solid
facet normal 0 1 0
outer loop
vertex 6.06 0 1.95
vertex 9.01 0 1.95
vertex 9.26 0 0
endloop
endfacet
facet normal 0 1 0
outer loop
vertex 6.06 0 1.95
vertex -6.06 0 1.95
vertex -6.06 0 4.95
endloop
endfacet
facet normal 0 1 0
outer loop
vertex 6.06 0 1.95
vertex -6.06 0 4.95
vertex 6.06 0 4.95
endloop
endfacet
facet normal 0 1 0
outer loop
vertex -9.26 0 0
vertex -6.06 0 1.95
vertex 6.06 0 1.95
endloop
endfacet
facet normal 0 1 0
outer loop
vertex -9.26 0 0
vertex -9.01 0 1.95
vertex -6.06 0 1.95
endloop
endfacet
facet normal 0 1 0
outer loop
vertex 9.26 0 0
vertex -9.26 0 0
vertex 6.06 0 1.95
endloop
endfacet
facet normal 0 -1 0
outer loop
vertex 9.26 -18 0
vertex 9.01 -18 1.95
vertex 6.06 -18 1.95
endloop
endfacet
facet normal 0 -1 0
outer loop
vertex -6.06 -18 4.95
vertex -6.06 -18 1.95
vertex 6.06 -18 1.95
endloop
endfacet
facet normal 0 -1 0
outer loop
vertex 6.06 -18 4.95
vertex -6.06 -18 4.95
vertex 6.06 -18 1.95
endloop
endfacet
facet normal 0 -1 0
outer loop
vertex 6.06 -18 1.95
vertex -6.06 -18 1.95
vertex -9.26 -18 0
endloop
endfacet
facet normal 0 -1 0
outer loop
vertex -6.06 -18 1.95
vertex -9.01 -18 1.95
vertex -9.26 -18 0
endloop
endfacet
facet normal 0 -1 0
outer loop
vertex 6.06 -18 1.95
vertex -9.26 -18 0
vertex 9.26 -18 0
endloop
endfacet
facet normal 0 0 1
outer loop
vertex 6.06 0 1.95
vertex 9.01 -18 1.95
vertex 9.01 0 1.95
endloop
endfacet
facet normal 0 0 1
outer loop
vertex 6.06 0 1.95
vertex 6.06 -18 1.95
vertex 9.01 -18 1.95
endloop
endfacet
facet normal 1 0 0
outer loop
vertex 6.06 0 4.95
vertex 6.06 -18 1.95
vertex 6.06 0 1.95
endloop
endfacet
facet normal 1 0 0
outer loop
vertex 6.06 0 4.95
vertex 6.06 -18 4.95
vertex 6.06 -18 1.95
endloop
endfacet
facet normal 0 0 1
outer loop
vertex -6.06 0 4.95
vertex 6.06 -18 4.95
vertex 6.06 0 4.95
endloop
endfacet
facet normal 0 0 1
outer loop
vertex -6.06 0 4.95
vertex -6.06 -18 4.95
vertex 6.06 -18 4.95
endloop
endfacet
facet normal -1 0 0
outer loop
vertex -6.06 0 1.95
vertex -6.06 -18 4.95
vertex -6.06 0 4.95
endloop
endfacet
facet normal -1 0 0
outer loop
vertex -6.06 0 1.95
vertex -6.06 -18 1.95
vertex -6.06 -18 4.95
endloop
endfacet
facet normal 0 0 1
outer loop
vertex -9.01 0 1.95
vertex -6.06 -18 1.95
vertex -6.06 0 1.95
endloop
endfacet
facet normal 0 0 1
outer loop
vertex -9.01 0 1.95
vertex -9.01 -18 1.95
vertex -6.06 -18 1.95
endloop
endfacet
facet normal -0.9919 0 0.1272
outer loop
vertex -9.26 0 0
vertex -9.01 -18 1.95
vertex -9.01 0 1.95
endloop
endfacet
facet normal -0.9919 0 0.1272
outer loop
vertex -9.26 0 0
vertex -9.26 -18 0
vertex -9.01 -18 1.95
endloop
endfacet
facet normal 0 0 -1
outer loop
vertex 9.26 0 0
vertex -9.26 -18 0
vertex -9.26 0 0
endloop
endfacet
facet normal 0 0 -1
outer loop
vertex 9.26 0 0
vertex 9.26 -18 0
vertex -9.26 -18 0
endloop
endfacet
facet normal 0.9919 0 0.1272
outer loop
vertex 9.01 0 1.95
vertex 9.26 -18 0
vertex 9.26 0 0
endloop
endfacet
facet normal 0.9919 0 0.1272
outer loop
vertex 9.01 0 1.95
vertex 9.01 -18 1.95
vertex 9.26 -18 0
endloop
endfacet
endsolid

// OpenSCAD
hotshoeWidth = 18.52;
hotshoeThickness = 1.95;
hotshoeLength = 18;
hotshoeInset = 3.2;
hotshoeTaper = 0.25;

    
    
module hotshoe(coverStickout = 0) {    
hotshoeProfile = [
    [-hotshoeWidth/2, 0],
    [-hotshoeWidth/2+hotshoeTaper, hotshoeThickness],
    [-hotshoeWidth/2+hotshoeInset, hotshoeThickness],
    [-hotshoeWidth/2+hotshoeInset, hotshoeThickness+coverStickout],
    [hotshoeWidth/2-hotshoeInset, hotshoeThickness++coverStickout],
    [hotshoeWidth/2-hotshoeInset, hotshoeThickness],
    [hotshoeWidth/2-hotshoeTaper, hotshoeThickness],
    [hotshoeWidth/2, 0] ];

    rotate([90,0,0])
    linear_extrude(height=hotshoeLength) polygon(hotshoeProfile);
}

hotshoe(coverStickout = 3);
